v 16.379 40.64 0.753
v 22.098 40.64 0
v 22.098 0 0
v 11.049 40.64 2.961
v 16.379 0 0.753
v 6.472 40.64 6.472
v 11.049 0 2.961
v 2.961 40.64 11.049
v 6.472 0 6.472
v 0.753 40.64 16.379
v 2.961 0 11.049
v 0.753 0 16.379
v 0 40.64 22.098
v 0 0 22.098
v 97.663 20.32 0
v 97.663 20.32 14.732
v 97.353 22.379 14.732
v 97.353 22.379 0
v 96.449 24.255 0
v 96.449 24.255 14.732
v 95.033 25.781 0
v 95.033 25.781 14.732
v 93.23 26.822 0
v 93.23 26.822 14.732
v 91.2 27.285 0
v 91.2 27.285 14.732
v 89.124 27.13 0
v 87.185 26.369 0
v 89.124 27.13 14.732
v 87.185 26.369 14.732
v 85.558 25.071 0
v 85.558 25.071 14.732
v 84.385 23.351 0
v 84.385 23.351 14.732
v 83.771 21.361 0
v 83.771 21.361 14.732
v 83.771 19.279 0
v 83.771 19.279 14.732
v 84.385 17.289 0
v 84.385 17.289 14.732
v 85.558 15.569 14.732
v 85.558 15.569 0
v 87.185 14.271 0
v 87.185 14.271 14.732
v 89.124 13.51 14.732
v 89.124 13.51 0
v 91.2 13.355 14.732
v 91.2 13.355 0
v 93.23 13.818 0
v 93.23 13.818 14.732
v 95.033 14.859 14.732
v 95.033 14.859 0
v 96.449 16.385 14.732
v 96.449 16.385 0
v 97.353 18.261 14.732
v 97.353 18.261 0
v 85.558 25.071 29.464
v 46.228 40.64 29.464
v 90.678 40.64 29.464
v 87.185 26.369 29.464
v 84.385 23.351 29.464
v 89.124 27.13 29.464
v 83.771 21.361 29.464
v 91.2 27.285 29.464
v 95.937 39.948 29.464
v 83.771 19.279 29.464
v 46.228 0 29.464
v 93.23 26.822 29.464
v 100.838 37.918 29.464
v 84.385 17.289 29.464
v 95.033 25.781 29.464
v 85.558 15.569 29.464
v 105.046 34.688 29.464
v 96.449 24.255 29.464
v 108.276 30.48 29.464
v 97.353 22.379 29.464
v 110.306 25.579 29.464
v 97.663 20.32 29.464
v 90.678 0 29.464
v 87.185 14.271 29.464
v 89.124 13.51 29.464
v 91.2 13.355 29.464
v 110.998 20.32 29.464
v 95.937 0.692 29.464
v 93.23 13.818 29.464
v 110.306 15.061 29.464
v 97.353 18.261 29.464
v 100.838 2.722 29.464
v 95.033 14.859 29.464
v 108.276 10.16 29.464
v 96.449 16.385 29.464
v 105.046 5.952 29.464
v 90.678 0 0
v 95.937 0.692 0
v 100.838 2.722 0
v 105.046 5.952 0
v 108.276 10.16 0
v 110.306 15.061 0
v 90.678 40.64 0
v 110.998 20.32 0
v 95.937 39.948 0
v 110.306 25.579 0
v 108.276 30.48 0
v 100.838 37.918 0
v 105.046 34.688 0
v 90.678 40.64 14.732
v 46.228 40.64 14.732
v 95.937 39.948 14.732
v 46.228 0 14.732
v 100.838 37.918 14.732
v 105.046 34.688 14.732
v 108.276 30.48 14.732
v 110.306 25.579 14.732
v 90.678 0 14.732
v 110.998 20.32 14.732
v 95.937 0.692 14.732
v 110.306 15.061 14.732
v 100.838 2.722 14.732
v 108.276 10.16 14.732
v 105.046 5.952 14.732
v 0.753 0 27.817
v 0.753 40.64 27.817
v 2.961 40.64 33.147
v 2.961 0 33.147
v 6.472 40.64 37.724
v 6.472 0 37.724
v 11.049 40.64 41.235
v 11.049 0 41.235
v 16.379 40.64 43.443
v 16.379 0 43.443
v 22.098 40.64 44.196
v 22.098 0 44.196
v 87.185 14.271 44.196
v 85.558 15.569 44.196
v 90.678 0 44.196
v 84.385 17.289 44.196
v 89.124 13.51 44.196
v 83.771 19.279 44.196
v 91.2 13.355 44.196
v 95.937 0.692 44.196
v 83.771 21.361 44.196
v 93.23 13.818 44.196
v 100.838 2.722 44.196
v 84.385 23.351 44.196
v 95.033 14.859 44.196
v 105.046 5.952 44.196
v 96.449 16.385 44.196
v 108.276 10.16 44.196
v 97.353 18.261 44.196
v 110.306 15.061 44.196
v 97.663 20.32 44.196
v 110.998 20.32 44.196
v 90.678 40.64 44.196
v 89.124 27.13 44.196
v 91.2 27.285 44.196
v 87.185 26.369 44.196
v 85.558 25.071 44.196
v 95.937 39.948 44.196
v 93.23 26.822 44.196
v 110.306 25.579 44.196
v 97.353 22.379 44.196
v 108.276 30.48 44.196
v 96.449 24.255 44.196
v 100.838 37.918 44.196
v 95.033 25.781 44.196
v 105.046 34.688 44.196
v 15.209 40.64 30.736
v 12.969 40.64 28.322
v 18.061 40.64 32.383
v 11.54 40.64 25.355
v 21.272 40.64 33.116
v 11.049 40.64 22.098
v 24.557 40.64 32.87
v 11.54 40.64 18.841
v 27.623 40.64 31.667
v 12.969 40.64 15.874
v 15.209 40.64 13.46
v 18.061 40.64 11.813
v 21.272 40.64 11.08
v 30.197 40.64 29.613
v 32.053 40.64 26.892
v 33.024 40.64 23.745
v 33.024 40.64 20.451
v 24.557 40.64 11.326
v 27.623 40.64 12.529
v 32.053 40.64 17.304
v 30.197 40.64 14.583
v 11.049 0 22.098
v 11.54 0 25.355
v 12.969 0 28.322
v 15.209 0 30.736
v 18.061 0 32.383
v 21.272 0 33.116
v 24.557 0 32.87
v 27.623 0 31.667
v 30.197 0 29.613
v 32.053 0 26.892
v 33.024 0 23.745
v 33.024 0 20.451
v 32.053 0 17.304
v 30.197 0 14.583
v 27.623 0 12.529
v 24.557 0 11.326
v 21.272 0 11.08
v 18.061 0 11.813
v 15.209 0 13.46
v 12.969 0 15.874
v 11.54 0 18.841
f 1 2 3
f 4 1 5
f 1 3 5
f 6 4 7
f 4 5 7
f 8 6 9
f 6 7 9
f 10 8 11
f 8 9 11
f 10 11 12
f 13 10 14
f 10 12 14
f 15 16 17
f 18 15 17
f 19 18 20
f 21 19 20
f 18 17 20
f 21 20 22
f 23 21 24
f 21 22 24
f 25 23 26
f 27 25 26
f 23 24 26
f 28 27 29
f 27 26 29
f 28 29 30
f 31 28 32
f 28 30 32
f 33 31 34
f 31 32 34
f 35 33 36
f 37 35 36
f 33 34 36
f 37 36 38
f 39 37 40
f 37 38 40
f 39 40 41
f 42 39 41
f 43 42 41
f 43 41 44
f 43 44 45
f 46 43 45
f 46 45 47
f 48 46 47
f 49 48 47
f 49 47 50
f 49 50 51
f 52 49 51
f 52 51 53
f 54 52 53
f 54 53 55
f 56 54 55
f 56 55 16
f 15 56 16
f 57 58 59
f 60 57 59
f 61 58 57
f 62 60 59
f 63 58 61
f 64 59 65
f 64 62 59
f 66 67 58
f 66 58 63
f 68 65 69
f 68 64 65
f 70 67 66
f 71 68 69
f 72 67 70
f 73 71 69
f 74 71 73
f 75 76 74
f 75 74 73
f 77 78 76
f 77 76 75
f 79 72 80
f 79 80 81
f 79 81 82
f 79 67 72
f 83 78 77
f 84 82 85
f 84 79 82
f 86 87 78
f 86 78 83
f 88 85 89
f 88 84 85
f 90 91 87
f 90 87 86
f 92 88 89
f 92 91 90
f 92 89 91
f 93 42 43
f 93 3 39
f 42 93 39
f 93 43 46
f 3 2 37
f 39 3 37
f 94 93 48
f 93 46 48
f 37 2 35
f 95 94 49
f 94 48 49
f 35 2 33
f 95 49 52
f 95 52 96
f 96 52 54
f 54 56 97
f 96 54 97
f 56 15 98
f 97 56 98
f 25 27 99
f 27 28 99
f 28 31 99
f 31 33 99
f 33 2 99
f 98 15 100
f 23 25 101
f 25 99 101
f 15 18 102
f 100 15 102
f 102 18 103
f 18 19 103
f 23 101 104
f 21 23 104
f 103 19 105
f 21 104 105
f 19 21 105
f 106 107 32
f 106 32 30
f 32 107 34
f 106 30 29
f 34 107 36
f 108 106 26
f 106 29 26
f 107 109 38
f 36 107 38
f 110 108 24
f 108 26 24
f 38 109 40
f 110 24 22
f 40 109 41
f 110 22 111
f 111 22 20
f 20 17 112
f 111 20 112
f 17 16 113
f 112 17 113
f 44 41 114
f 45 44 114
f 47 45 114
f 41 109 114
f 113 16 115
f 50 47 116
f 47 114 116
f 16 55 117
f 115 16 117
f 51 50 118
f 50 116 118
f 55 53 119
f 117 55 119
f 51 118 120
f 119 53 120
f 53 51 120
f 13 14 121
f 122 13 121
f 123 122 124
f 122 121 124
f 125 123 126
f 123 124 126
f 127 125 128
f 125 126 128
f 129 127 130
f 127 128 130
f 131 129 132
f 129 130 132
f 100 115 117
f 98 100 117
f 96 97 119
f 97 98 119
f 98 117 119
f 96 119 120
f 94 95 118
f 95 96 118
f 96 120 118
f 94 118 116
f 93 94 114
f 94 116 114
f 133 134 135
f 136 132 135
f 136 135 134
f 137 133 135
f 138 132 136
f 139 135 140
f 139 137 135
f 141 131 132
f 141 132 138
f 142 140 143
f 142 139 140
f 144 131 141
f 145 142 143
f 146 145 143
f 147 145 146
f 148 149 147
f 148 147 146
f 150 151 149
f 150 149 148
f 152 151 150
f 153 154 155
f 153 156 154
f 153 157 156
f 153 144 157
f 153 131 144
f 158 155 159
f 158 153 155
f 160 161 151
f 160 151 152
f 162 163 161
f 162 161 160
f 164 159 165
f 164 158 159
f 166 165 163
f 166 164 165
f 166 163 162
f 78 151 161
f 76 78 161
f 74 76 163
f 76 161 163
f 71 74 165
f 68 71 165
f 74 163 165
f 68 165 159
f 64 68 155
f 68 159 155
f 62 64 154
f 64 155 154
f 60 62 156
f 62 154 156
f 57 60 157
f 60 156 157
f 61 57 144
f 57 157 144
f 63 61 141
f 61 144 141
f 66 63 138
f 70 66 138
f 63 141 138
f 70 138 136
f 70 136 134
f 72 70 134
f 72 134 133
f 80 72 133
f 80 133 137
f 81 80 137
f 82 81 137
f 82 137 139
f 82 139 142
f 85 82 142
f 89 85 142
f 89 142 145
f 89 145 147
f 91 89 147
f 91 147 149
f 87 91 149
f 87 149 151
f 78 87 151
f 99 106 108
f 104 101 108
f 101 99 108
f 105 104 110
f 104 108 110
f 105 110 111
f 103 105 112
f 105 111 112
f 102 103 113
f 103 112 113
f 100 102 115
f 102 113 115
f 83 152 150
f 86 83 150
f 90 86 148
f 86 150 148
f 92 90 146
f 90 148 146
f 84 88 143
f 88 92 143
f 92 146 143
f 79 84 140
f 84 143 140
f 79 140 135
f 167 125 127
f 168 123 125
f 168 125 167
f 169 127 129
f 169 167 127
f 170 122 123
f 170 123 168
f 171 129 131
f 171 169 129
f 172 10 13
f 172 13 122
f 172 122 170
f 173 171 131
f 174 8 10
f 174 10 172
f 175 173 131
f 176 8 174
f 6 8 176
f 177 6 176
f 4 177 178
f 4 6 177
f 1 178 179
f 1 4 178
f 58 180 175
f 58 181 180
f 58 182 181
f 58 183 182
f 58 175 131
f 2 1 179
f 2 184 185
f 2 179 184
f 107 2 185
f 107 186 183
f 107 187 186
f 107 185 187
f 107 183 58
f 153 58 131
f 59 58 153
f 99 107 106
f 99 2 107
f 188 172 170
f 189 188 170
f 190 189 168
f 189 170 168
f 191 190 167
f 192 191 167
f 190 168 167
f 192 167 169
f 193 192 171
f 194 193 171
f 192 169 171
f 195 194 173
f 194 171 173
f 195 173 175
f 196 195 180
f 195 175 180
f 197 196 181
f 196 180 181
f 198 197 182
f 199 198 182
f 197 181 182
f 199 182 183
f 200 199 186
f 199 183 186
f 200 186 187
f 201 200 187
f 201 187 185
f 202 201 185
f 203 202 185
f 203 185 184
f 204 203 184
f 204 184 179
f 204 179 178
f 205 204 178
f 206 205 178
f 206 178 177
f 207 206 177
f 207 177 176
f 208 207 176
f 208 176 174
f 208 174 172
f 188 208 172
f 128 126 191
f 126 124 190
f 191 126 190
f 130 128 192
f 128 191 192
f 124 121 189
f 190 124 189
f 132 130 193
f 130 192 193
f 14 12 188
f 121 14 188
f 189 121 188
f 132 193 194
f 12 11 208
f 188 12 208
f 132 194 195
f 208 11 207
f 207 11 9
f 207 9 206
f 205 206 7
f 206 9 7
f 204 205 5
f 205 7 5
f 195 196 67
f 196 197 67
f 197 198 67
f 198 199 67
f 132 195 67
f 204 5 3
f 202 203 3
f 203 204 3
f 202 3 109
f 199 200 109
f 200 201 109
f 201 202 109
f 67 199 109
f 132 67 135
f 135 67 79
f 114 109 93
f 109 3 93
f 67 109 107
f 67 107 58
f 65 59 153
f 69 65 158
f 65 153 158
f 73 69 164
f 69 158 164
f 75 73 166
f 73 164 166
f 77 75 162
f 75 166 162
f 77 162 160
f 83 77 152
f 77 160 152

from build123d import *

# Parameters (mm, degrees)
F0_W     = 110.998
F0_H     = 40.64
F1_DEPTH = 44.196
F5_D     = 22.098
F2_R     = 6.985
F6_DEPTH = 44.197
F7_DEPTH = 44.197
F3_W     = 64.77
F3_H     = 14.732
F8_DEPTH = 40.641
F9_DEPTH = 40.641


with BuildPart() as f1:
    # F0 (on Top) → F1 (new body)
    with BuildSketch(Plane.XY):
        with Locations((55.499, 20.32)):
            Rectangle(F0_W, F0_H)
    extrude(amount=F1_DEPTH)

    # F5 (through all)
    with Locations(Plane.XZ):
        with Locations((22.098, 22.098)):
            Hole(F5_D / 2)

    # F2 (on face) → F6 (cut, through all)
    with BuildSketch(Plane.XY.offset(44.196)):
        with Locations((90.678, 20.32)):
            Circle(F2_R)
    extrude(amount=-F6_DEPTH, mode=Mode.SUBTRACT)

    # F2 (on face) → F7 (cut, through all)
    with BuildSketch(Plane.XY.offset(44.196)):
        with BuildLine():
            ThreePointArc((90.678, 40.64), (105.0464097937, 34.6884097937), (110.998, 20.32))
            Line((110.998, 20.32), (110.998, 40.64))
            Line((110.998, 40.64), (90.678, 40.64))
        make_face()
        with BuildLine():
            Line((110.998, 0), (110.998, 20.32))
            ThreePointArc((110.998, 20.32), (105.0464097937, 5.9515902063), (90.678, 0))
            Line((90.678, 0), (110.998, 0))
        make_face()
    extrude(amount=-F7_DEPTH, mode=Mode.SUBTRACT)

    # F3 (on face) → F8 (cut, through all)
    with BuildSketch(Plane.XZ):
        with Locations((78.613, 22.098)):
            Rectangle(F3_W, F3_H)
    extrude(amount=-F8_DEPTH, mode=Mode.SUBTRACT)

    # F3 (on face) → F9 (cut, through all)
    with BuildSketch(Plane.XZ):
        with BuildLine():
            ThreePointArc((0, 22.098), (6.4723544116, 37.7236457129), (22.098000176, 44.196))
            Line((22.098000176, 44.196), (0, 44.196))
            Line((0, 44.196), (0, 22.098))
        make_face()
        with BuildLine():
            Line((0, 0), (22.098, 0))
            ThreePointArc((22.098, 0), (6.4723543493, 6.4723543493), (0, 22.098))
            Line((0, 22.098), (0, 0))
        make_face()
    extrude(amount=-F9_DEPTH, mode=Mode.SUBTRACT)


solid = f1.part
